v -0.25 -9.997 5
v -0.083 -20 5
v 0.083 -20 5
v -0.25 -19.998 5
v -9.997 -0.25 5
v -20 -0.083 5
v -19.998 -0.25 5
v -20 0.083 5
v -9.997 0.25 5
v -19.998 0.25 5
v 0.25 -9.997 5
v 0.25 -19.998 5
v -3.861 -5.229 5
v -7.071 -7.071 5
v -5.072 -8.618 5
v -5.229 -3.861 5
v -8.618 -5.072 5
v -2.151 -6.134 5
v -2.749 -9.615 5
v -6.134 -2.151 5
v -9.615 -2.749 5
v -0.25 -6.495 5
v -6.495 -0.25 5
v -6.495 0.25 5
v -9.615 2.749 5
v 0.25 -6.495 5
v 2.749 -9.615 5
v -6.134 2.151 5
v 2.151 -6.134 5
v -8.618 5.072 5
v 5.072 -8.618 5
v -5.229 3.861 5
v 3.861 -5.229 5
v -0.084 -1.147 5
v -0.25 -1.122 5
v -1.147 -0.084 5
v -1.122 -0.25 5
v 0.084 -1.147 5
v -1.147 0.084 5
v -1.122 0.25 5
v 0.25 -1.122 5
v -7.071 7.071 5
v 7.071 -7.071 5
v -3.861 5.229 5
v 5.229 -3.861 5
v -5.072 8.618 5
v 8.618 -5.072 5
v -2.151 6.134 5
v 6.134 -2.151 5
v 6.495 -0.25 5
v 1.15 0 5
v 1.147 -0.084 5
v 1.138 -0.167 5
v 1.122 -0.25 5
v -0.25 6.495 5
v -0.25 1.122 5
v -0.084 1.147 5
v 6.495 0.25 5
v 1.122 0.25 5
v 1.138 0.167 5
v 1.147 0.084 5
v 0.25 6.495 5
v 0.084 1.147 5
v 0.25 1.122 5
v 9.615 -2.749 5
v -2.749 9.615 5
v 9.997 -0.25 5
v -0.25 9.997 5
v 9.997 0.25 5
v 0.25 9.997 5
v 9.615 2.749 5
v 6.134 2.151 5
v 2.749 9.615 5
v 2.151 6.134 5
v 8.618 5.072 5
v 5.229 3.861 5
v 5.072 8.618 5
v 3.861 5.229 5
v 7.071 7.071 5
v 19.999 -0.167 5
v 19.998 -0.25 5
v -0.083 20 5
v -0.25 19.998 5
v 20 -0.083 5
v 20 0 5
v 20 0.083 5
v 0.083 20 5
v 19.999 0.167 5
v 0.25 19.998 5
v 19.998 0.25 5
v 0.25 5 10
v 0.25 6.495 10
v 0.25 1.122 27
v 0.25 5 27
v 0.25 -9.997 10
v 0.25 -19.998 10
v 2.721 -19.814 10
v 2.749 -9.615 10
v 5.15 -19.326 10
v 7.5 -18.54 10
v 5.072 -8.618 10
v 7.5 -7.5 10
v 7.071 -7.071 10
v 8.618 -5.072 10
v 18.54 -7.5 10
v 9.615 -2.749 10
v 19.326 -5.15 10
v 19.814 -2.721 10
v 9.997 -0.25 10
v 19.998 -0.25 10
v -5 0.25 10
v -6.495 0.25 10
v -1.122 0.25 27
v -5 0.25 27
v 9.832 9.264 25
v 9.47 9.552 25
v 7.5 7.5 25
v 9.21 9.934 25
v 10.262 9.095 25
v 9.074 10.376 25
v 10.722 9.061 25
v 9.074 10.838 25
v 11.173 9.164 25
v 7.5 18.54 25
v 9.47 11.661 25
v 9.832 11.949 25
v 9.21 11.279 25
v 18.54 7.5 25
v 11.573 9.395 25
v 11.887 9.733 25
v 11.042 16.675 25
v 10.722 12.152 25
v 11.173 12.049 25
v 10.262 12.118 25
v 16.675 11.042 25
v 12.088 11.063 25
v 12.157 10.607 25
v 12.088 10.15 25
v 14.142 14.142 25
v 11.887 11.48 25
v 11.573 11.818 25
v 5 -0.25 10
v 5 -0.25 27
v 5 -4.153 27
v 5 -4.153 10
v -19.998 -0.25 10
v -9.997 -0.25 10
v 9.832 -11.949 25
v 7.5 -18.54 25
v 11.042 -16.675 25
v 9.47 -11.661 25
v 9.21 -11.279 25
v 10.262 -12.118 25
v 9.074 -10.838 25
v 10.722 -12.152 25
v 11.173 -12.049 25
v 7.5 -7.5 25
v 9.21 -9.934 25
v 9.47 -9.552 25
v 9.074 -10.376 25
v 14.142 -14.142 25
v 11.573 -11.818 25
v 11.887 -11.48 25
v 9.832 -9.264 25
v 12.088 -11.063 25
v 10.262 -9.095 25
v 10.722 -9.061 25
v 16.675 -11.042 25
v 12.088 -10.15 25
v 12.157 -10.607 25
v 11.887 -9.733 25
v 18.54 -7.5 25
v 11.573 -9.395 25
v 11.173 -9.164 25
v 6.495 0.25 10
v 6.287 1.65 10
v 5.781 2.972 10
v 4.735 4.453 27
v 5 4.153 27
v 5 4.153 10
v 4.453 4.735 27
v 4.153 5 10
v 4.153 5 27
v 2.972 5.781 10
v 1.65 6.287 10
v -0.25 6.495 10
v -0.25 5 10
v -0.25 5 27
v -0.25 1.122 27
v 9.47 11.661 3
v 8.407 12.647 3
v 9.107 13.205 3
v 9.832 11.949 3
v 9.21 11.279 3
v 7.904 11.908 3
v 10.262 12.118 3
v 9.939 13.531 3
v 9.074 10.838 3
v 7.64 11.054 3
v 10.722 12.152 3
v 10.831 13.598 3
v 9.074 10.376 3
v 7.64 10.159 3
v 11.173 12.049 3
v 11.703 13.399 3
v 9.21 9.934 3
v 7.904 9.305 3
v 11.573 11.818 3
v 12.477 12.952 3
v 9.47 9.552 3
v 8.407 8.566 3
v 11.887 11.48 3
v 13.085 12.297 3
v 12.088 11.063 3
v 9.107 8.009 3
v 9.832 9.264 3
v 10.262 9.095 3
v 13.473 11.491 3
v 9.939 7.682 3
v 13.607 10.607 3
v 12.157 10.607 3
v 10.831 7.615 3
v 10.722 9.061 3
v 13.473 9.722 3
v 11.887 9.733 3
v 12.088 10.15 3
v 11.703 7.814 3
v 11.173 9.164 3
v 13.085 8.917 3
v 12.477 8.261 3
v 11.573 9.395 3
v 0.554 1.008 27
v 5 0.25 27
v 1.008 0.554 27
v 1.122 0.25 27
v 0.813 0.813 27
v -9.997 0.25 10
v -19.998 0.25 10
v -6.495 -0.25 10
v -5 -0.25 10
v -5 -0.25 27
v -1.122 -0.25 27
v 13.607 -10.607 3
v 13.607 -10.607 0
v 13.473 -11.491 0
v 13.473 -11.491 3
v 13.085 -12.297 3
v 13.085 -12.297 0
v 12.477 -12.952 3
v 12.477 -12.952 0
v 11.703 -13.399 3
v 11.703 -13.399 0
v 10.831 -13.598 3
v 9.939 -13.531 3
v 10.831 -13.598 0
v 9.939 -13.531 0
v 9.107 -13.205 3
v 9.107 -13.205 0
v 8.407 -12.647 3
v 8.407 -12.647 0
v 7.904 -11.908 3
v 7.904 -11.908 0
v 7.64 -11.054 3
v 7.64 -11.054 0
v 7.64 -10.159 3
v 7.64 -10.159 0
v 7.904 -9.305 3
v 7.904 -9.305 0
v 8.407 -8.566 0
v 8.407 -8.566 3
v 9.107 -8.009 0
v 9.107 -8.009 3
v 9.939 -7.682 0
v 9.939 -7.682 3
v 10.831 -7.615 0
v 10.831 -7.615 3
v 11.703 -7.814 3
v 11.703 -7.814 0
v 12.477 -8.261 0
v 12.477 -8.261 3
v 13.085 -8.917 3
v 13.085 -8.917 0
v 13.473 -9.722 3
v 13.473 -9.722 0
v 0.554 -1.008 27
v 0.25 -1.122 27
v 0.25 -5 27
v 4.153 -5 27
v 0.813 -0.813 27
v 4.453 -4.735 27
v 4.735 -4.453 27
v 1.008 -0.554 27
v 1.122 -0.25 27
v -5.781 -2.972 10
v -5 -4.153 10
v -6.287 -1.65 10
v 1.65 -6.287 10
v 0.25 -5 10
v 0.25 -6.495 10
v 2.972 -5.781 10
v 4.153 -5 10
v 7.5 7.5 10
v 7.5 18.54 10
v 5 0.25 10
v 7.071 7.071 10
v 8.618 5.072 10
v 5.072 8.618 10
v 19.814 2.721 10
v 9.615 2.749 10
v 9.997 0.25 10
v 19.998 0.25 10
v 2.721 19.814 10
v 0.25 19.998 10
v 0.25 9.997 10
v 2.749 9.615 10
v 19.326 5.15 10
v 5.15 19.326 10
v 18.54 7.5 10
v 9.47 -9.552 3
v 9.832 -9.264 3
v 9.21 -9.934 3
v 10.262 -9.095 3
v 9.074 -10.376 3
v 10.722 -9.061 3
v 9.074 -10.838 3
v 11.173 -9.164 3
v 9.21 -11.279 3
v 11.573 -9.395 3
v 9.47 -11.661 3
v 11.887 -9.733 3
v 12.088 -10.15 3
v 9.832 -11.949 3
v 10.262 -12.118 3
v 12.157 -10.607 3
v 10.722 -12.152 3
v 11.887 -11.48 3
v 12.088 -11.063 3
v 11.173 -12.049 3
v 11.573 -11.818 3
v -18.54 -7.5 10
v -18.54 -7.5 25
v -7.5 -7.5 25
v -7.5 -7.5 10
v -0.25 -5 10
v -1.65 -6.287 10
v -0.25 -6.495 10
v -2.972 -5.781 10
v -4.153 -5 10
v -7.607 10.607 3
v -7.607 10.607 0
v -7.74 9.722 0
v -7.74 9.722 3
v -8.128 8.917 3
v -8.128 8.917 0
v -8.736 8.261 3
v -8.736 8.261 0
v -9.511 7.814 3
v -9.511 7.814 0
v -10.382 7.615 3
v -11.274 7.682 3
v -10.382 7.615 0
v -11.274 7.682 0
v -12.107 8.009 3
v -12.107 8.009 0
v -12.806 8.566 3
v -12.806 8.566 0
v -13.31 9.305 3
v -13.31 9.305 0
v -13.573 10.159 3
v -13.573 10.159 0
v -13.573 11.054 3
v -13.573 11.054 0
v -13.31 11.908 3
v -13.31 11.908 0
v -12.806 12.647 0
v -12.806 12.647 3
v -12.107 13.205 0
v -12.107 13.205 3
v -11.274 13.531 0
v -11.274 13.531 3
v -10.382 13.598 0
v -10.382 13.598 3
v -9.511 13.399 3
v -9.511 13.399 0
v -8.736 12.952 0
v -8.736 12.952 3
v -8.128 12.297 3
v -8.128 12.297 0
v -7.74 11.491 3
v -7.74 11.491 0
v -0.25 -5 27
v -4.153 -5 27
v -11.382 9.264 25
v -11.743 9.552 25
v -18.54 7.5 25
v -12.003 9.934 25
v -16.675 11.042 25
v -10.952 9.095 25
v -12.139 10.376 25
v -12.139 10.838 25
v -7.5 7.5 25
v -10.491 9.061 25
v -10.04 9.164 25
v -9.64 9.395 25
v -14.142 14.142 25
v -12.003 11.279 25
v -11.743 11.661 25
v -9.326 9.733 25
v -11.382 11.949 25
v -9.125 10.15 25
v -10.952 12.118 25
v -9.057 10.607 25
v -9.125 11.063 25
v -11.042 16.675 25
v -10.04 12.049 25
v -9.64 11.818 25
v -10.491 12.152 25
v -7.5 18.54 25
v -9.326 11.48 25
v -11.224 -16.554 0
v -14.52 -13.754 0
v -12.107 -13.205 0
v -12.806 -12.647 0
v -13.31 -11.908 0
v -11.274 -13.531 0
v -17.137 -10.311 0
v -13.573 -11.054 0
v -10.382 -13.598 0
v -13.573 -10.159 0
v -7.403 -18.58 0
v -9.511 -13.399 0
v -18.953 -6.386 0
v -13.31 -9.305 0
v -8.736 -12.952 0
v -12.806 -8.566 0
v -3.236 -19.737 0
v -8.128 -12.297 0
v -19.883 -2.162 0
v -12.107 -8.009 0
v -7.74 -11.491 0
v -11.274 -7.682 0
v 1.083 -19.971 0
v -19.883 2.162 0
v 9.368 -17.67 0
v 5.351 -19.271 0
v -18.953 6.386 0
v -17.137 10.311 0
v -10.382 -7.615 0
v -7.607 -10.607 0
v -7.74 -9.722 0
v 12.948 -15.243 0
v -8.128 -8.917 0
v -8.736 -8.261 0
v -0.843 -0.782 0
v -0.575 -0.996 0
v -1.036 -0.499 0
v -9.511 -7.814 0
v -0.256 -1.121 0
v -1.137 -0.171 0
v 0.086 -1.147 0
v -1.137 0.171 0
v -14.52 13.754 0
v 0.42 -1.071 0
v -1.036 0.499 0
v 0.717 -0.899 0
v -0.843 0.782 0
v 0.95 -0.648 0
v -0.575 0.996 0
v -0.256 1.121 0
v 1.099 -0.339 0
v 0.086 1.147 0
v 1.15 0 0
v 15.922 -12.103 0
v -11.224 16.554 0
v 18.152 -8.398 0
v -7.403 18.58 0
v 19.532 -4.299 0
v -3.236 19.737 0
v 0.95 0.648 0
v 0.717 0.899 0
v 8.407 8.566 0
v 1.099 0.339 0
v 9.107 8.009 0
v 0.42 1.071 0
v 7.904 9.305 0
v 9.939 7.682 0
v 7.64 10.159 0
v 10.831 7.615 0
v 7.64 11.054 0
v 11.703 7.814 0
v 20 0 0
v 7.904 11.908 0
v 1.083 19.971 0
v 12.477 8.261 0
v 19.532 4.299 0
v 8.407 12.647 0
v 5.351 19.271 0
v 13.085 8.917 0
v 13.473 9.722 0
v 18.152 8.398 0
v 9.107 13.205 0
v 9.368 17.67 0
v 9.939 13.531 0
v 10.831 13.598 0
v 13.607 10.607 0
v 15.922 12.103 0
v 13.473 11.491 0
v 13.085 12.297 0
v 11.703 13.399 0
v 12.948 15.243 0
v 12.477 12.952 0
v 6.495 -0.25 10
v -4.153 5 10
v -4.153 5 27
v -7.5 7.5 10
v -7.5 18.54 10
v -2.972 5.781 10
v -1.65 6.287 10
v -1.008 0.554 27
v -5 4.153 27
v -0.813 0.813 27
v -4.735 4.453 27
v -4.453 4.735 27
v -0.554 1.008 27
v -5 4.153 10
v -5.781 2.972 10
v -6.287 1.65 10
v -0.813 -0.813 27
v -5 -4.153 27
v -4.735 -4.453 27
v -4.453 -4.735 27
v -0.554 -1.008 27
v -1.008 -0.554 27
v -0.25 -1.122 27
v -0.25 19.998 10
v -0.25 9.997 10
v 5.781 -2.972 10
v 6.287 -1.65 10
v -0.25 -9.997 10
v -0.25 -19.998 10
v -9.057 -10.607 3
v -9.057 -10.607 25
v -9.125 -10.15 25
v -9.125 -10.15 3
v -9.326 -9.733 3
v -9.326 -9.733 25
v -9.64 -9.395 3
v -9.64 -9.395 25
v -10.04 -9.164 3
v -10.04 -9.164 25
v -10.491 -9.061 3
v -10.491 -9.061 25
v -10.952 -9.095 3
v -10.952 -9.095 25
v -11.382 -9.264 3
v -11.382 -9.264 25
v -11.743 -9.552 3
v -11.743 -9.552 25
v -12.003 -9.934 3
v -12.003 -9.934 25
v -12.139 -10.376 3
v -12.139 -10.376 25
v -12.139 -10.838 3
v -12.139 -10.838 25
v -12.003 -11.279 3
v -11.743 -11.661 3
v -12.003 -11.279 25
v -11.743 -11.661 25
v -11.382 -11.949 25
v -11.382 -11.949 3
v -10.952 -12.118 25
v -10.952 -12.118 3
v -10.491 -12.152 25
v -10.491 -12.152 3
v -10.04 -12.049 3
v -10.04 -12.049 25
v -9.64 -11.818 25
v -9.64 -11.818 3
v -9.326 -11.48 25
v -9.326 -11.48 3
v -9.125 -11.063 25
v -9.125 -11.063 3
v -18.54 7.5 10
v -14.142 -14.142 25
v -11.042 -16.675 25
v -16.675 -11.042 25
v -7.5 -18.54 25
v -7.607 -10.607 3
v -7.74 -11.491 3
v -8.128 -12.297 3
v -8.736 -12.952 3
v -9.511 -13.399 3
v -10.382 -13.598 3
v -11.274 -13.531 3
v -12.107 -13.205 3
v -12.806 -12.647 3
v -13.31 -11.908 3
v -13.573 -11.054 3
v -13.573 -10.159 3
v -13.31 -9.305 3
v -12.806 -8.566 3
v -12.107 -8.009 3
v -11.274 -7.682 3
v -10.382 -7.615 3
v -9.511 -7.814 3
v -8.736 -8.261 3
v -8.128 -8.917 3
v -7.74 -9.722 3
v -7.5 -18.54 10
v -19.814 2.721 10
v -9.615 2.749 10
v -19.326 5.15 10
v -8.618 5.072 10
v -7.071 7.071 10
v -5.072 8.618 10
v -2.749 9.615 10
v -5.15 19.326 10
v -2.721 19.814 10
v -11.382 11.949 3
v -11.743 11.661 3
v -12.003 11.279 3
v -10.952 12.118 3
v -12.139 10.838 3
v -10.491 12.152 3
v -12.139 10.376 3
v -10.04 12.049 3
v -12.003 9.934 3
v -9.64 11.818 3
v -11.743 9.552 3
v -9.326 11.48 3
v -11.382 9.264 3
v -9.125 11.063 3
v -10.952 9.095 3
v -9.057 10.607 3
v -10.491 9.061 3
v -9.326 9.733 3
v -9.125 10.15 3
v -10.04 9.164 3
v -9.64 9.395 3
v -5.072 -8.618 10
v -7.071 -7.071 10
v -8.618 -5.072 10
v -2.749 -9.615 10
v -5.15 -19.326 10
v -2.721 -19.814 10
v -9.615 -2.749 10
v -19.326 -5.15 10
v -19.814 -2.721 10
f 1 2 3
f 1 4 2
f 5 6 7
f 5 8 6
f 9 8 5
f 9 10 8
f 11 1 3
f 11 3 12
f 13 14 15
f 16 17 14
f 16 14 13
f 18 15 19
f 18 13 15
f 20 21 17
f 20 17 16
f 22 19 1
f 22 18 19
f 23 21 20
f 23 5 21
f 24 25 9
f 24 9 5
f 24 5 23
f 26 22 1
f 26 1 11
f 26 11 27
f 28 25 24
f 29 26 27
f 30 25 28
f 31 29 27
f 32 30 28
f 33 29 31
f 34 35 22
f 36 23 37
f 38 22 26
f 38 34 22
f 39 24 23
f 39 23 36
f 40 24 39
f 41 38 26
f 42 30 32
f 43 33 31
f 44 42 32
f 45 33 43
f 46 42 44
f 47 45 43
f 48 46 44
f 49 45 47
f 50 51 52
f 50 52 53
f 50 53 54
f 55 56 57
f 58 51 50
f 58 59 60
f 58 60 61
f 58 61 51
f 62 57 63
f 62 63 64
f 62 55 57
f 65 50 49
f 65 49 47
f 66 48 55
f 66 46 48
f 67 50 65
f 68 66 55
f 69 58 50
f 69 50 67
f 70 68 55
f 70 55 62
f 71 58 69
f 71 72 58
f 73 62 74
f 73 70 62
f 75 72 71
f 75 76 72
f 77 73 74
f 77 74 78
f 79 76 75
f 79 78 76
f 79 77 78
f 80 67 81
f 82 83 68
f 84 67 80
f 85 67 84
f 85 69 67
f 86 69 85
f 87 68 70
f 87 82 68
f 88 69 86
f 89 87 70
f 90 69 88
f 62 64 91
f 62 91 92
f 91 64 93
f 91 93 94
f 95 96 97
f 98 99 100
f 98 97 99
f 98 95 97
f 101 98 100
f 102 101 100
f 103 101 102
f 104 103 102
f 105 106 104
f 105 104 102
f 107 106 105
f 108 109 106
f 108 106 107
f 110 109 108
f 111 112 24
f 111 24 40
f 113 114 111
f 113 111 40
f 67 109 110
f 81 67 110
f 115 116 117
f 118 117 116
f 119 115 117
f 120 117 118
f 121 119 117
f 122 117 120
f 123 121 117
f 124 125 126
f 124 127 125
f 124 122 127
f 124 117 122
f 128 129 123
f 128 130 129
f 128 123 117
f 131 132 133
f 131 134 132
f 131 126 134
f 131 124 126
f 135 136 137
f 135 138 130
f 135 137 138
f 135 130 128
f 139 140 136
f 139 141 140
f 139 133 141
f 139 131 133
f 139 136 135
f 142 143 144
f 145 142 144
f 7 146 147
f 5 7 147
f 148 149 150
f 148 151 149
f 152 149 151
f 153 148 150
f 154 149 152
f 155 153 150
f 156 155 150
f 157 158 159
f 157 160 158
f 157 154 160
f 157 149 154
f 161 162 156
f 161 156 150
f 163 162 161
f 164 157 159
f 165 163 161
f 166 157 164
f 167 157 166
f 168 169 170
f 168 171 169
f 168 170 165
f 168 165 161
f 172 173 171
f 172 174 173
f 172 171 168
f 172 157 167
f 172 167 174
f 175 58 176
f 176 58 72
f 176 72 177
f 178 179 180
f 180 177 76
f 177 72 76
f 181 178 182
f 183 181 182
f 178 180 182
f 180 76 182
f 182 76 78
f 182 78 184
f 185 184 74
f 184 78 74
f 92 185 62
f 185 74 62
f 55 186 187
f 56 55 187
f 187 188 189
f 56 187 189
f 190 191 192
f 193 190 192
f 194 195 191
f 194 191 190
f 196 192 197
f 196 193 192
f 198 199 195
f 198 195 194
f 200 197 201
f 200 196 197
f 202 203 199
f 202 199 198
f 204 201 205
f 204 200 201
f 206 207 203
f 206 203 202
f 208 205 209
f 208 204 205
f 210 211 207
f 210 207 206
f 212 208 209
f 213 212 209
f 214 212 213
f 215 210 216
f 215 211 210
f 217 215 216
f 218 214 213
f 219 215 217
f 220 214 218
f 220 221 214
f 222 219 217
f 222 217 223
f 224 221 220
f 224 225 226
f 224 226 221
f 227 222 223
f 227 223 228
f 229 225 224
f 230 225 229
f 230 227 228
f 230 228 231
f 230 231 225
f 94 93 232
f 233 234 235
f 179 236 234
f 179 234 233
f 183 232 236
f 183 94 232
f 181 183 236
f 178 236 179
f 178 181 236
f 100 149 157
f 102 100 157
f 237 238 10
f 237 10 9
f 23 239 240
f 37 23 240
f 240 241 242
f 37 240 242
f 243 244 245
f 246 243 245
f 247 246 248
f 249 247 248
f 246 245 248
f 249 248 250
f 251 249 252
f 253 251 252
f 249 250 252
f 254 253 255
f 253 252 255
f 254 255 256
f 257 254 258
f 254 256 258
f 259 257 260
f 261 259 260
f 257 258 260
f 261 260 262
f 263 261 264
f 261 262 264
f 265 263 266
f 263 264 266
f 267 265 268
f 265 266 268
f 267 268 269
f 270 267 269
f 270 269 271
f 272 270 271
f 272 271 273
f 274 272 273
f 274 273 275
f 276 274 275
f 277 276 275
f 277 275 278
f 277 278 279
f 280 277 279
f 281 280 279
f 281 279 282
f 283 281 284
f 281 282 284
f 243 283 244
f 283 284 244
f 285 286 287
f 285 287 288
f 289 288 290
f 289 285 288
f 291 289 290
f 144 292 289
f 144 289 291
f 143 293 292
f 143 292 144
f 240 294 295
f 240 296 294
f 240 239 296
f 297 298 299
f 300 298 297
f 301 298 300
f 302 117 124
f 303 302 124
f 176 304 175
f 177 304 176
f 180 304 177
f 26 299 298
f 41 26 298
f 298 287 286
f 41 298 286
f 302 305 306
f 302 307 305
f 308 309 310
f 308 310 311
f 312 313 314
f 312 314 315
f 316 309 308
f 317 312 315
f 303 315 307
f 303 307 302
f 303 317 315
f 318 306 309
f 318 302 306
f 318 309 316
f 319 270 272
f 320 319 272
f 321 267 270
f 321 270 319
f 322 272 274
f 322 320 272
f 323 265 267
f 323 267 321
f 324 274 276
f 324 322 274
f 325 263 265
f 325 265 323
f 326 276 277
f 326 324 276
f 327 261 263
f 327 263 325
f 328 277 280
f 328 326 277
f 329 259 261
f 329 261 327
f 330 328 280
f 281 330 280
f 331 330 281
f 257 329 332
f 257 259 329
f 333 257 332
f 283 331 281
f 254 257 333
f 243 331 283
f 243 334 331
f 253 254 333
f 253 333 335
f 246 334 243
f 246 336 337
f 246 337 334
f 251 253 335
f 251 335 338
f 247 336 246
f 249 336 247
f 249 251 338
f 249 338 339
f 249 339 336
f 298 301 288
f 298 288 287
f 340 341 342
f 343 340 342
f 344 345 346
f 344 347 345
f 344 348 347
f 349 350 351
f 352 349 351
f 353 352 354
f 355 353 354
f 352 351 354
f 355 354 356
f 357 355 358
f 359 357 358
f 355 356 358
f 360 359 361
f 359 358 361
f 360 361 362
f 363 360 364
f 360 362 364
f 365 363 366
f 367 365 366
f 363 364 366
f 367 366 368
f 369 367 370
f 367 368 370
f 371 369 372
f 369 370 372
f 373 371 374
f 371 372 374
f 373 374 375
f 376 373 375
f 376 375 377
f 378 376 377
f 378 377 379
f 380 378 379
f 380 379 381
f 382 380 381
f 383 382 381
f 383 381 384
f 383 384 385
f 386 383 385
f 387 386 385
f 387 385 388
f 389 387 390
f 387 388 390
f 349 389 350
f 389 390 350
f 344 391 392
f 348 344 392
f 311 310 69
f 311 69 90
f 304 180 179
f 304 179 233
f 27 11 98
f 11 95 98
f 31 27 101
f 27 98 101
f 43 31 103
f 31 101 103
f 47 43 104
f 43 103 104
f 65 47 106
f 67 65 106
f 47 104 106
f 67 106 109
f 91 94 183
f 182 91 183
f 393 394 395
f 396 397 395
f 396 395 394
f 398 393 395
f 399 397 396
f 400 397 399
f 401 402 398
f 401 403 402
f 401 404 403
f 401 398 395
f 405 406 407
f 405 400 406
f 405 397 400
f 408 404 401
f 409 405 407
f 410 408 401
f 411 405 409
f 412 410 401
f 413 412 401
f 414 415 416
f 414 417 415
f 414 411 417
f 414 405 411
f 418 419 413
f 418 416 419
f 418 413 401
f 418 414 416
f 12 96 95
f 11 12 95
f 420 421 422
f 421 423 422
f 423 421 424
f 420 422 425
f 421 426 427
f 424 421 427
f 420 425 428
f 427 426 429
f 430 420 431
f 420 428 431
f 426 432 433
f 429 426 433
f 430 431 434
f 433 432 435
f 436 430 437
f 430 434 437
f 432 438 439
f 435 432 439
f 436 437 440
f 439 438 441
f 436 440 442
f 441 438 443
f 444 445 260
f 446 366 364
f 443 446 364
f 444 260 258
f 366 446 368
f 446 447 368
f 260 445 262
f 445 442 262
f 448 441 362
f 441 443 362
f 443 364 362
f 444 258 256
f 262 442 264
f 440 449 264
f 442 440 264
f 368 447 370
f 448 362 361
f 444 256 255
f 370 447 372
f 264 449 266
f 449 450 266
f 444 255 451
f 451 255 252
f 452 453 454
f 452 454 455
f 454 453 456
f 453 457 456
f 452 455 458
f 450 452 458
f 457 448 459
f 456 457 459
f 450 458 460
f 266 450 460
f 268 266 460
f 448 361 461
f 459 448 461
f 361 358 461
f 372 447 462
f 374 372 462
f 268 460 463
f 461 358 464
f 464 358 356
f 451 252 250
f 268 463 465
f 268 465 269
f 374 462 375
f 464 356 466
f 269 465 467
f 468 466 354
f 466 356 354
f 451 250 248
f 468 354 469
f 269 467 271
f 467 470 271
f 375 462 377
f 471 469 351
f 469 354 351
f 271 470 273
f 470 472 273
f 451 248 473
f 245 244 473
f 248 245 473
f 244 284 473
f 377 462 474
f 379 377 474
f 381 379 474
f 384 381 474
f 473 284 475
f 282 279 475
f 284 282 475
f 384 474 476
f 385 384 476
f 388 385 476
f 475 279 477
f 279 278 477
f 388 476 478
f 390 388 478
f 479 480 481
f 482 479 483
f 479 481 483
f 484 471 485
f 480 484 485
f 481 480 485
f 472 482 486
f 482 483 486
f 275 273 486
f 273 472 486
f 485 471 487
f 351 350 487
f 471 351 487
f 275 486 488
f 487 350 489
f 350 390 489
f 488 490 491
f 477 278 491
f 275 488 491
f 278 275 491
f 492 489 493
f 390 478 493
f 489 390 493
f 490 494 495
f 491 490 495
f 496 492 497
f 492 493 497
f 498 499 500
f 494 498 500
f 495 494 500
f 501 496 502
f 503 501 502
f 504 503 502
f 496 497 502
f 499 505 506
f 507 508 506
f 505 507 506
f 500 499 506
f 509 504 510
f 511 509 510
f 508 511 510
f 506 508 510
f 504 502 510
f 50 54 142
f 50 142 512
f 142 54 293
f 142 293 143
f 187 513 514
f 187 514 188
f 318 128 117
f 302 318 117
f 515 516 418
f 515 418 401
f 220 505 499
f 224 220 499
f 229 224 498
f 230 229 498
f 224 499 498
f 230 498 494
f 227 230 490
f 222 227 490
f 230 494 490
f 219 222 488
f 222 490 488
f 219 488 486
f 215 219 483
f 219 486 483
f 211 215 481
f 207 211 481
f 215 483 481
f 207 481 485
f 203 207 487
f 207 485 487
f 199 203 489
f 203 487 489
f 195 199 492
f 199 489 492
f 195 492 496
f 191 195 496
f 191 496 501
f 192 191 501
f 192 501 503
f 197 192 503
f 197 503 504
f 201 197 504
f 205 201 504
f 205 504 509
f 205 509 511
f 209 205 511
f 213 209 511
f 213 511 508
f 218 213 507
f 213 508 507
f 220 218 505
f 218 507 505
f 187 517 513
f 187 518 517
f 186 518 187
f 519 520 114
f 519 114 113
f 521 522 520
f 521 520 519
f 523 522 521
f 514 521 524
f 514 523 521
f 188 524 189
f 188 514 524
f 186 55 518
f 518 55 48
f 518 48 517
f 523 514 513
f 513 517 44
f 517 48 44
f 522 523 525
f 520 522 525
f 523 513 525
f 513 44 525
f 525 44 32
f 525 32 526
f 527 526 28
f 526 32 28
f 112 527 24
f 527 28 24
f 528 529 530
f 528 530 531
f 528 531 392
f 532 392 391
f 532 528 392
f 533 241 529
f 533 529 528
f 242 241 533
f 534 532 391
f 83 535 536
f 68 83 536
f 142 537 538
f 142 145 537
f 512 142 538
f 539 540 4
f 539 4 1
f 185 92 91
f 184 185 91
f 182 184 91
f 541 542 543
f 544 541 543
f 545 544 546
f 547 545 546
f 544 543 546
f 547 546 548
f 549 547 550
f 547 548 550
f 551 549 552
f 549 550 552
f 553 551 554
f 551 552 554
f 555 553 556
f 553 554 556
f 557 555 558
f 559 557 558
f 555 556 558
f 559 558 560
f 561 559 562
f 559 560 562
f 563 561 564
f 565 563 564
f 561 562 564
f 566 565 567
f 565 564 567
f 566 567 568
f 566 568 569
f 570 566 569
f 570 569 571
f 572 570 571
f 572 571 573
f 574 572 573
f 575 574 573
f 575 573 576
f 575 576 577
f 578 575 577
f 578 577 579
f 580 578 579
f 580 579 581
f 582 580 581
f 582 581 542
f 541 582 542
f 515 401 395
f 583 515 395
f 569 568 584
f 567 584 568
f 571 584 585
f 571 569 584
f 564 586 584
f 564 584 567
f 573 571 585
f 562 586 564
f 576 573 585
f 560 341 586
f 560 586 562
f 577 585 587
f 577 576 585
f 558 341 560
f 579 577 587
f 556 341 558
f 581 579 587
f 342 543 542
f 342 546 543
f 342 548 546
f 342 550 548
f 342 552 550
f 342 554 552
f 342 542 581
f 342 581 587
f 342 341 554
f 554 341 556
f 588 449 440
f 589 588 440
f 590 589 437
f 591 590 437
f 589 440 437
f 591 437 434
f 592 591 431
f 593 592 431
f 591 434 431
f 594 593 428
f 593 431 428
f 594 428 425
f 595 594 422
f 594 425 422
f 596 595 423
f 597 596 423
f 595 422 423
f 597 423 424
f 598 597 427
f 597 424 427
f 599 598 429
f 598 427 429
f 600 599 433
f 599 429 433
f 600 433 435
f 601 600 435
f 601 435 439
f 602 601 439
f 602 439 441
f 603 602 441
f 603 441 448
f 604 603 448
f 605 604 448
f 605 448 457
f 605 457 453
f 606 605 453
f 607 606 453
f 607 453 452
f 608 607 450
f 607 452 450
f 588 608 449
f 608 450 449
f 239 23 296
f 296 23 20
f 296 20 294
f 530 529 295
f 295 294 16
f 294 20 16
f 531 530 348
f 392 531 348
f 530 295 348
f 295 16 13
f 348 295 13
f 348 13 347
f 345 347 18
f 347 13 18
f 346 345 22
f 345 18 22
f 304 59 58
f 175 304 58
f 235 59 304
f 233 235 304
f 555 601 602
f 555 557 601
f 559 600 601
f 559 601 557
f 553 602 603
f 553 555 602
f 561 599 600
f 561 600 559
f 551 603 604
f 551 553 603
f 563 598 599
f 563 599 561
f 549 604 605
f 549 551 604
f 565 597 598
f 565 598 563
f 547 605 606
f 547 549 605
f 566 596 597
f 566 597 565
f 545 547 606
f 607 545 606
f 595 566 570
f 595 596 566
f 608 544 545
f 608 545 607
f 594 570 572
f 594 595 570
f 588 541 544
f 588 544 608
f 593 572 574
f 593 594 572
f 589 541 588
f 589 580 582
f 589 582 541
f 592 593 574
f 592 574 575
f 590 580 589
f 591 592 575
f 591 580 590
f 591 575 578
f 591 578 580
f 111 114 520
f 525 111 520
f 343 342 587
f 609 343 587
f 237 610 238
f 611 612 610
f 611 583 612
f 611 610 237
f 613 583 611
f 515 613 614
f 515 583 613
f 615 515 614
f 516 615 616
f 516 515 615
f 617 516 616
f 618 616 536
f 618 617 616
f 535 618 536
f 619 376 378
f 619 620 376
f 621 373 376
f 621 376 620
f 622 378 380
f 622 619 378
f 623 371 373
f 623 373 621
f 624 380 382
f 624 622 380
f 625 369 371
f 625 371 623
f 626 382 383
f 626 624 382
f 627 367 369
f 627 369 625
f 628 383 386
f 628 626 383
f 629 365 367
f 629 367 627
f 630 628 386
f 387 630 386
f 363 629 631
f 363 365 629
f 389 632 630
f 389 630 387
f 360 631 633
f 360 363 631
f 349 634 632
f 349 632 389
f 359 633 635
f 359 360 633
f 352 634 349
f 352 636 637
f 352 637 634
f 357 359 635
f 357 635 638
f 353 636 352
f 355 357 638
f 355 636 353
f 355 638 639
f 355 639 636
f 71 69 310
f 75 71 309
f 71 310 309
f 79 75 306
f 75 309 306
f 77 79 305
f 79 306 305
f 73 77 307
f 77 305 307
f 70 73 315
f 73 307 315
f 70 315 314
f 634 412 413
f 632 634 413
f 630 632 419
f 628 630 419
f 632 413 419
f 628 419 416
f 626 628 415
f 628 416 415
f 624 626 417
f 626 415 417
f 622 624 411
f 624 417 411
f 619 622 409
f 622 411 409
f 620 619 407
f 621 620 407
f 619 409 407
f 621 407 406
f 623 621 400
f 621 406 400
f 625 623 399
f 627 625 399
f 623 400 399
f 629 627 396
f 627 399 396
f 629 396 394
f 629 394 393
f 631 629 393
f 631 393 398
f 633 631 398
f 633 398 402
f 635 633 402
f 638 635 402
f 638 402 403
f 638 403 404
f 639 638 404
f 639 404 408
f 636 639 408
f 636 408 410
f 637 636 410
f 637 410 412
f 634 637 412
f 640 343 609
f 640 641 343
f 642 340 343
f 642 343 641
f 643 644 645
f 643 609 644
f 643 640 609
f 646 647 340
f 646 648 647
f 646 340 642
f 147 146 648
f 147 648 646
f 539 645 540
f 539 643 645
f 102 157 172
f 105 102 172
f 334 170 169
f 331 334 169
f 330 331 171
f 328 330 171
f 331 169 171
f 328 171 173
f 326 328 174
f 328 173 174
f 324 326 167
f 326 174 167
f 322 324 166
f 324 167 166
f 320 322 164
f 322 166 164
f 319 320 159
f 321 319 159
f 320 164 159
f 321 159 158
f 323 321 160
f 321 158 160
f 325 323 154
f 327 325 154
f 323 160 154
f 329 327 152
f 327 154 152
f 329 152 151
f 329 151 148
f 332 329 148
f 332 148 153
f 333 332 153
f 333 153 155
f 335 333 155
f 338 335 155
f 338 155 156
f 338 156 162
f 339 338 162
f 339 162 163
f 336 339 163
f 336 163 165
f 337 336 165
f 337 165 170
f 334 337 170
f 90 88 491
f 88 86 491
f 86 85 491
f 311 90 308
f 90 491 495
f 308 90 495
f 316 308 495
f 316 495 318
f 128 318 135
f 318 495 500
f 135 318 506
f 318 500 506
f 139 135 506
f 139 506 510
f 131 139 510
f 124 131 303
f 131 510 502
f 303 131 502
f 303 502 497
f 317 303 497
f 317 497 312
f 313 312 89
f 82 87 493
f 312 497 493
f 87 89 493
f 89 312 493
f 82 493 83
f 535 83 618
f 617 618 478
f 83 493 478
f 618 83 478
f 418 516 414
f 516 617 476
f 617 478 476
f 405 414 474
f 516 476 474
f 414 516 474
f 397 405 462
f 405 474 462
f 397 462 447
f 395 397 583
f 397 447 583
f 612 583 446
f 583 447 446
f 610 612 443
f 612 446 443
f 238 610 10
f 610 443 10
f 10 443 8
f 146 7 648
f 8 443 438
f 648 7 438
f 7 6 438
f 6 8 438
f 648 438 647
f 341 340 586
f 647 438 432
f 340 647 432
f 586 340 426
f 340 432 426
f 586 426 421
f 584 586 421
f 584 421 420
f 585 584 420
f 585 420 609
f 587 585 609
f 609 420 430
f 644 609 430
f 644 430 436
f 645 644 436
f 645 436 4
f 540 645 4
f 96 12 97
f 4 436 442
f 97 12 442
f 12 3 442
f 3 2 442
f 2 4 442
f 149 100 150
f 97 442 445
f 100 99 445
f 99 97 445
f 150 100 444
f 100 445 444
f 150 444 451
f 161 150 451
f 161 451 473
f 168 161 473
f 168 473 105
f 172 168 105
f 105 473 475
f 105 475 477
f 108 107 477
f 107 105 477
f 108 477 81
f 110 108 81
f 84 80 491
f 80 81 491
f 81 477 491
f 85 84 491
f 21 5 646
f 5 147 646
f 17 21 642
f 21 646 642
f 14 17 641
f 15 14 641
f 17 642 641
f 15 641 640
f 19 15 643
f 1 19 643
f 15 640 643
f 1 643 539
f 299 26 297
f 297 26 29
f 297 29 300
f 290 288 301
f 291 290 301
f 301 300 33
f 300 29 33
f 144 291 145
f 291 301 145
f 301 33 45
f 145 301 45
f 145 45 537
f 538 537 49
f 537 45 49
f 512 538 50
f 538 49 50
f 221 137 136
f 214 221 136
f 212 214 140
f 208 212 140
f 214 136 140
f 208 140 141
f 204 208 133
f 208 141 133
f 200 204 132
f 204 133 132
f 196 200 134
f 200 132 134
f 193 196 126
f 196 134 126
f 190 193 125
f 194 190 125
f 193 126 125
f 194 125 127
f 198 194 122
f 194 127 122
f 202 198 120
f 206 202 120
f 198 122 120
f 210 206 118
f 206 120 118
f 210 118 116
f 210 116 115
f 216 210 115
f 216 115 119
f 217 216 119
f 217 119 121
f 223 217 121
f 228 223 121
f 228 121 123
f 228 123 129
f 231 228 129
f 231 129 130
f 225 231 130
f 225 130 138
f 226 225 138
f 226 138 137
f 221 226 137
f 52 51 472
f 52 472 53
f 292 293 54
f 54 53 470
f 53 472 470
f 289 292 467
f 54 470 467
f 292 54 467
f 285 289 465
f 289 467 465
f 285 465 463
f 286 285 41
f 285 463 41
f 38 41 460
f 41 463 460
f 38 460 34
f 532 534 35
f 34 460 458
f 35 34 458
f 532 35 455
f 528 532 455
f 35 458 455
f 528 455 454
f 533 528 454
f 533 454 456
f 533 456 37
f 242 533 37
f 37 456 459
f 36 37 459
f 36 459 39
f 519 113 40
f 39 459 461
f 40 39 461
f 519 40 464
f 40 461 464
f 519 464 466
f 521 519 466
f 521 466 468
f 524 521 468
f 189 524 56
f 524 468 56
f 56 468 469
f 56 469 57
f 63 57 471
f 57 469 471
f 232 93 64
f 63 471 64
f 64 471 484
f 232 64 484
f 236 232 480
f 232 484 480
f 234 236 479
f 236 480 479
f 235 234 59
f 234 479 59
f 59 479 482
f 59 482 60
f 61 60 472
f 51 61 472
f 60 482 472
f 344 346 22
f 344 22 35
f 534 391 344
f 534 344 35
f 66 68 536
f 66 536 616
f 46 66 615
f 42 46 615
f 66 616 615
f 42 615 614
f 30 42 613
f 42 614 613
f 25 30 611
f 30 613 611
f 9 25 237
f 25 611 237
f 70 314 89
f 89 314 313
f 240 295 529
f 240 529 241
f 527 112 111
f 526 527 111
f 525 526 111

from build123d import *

# Parameters (mm, degrees)
F0_R      = 20
F1_DEPTH  = 25
F2_R      = 10
F3_DEPTH  = 20
F4_R      = 1.55
F5_DEPTH  = 25.001
F6_R      = 3
F7_DEPTH  = 3
F8_R      = 6.5
F9_DEPTH  = 22
F10_W     = 0.5
F10_H     = 21.0267571211
F10_H_2   = 0.5
F10_W_2   = 21.8651188016
F10_W_3   = 23.3558980227
F10_H_3   = 21.8529557288
F11_DEPTH = 20
F12_W     = 0.5
F12_H     = 6.25
F12_W_2   = 6.25
F12_H_2   = 0.5
F13_DEPTH = 22
F14_W     = 2.5
F14_H     = 2.5
F15_DEPTH = 15
F16_DEPTH = 2.001
F17_R     = 1.15
F18_DEPTH = 27.001


with BuildPart() as f1:
    # F0 (on Top) → F1 (new body)
    with BuildSketch(Plane.XY):
        Circle(F0_R)
    extrude(amount=F1_DEPTH)

    # F2 (on face) → F3 (cut)
    with BuildSketch(Plane.XY.offset(25)):
        Circle(F2_R)
    extrude(amount=-F3_DEPTH, mode=Mode.SUBTRACT)

    # F4 (on face) → F5 (cut, through all)
    with BuildSketch(Plane.XY.offset(25)):
        with Locations((10.6066017178, -10.6066017178)):
            Circle(F4_R)
        with Locations((10.6066017178, 10.6066017178)):
            Circle(F4_R)
        with Locations((-10.6066017178, 10.6066017178)):
            Circle(F4_R)
        with Locations((-10.6066017178, -10.6066017178)):
            Circle(F4_R)
    extrude(amount=-F5_DEPTH, mode=Mode.SUBTRACT)

    # F6 (on face) → F7 (cut)
    with BuildSketch(Plane(origin=(0, 0, 0), x_dir=(1, 0, 0), z_dir=(0, 0, -1))):
        with Locations((-10.6066017178, 10.6066017178)):
            Circle(F6_R)
        with Locations((10.6066017178, 10.6066017178)):
            Circle(F6_R)
        with Locations((10.6066017178, -10.6066017178)):
            Circle(F6_R)
        with Locations((-10.6066017178, -10.6066017178)):
            Circle(F6_R)
    extrude(amount=-F7_DEPTH, mode=Mode.SUBTRACT)

    # F8 (on face) → F9 (join)
    with BuildSketch(Plane.XY.offset(5)):
        Circle(F8_R)
    extrude(amount=F9_DEPTH)

    # F10 (on face) → F11 (cut)
    with BuildSketch(Plane.XY.offset(25)):
        with Locations((0, 10.7633785605)):
            Rectangle(F10_W, F10_H)
        Rectangle(F10_W, F10_H_2)
        with Locations((-11.1825594008, 0)):
            Rectangle(F10_W_2, F10_H_2)
        with Locations((11.9279490113, 0)):
            Rectangle(F10_W_3, F10_H_2)
        with Locations((0, -11.1764778644)):
            Rectangle(F10_W, F10_H_3)
    extrude(amount=-F11_DEPTH, mode=Mode.SUBTRACT)

    # F12 (on face) → F13 (cut)
    with BuildSketch(Plane.XY.offset(27)):
        with Locations((0, 3.375)):
            Rectangle(F12_W, F12_H)
        with Locations((3.375, 0)):
            Rectangle(F12_W_2, F12_H_2)
        Rectangle(F12_W, F12_H_2)
        with Locations((-3.375, 0)):
            Rectangle(F12_W_2, F12_H_2)
        with Locations((0, -3.375)):
            Rectangle(F12_W, F12_H)
    extrude(amount=-F13_DEPTH, mode=Mode.SUBTRACT)

    # F14 (on face) → F15 (cut)
    with BuildSketch(Plane.XY.offset(25)):
        Polygon((7.5, 7.5), (7.5, 5), (5, 5), (5, -5), (7.5, -5), (7.5, -7.5), (29.6562510729, -7.5), (29.6562510729, 7.5), align=None)
        with Locations((6.25, 6.25)):
            Rectangle(F14_W, F14_H)
        Polygon((-5, 5), (5, 5), (5, 7.5), (7.5, 7.5), (7.5, 33.6244015744), (-7.5, 33.6244015744), (-7.5, 7.5), (-5, 7.5), align=None)
        Polygon((-5, -5), (-5, 5), (-7.5, 5), (-7.5, 7.5), (-34.9968748779, 7.5), (-34.9968748779, -7.5), (-7.5, -7.5), (-7.5, -5), align=None)
        with Locations((-6.25, 6.25)):
            Rectangle(F14_W, F14_H)
        Polygon((5, -7.5), (5, -5), (-5, -5), (-5, -7.5), (-7.5, -7.5), (-7.5, -35.9319086373), (7.5, -35.9319086373), (7.5, -7.5), align=None)
        with Locations((6.25, -6.25)):
            Rectangle(F14_W, F14_H)
        with Locations((-6.25, -6.25)):
            Rectangle(F14_W, F14_H)
    extrude(amount=-F15_DEPTH, mode=Mode.SUBTRACT)

    # F14 (on face) → F16 (cut, through all)
    with BuildSketch(Plane.XY.offset(25)):
        Polygon((7.5, 7.5), (7.5, 5), (5, 5), (5, -5), (7.5, -5), (7.5, -7.5), (29.6562510729, -7.5), (29.6562510729, 7.5), align=None)
        with Locations((6.25, 6.25)):
            Rectangle(F14_W, F14_H)
        Polygon((-5, 5), (5, 5), (5, 7.5), (7.5, 7.5), (7.5, 33.6244015744), (-7.5, 33.6244015744), (-7.5, 7.5), (-5, 7.5), align=None)
        Polygon((-5, -5), (-5, 5), (-7.5, 5), (-7.5, 7.5), (-34.9968748779, 7.5), (-34.9968748779, -7.5), (-7.5, -7.5), (-7.5, -5), align=None)
        with Locations((-6.25, 6.25)):
            Rectangle(F14_W, F14_H)
        Polygon((5, -7.5), (5, -5), (-5, -5), (-5, -7.5), (-7.5, -7.5), (-7.5, -35.9319086373), (7.5, -35.9319086373), (7.5, -7.5), align=None)
        with Locations((6.25, -6.25)):
            Rectangle(F14_W, F14_H)
        with Locations((-6.25, -6.25)):
            Rectangle(F14_W, F14_H)
    extrude(amount=F16_DEPTH, mode=Mode.SUBTRACT)

    # F17 (on face) → F18 (cut, through all)
    with BuildSketch(Plane(origin=(0, 0, 0), x_dir=(1, 0, 0), z_dir=(0, 0, -1))):
        Circle(F17_R)
    extrude(amount=-F18_DEPTH, mode=Mode.SUBTRACT)


solid = f1.part
